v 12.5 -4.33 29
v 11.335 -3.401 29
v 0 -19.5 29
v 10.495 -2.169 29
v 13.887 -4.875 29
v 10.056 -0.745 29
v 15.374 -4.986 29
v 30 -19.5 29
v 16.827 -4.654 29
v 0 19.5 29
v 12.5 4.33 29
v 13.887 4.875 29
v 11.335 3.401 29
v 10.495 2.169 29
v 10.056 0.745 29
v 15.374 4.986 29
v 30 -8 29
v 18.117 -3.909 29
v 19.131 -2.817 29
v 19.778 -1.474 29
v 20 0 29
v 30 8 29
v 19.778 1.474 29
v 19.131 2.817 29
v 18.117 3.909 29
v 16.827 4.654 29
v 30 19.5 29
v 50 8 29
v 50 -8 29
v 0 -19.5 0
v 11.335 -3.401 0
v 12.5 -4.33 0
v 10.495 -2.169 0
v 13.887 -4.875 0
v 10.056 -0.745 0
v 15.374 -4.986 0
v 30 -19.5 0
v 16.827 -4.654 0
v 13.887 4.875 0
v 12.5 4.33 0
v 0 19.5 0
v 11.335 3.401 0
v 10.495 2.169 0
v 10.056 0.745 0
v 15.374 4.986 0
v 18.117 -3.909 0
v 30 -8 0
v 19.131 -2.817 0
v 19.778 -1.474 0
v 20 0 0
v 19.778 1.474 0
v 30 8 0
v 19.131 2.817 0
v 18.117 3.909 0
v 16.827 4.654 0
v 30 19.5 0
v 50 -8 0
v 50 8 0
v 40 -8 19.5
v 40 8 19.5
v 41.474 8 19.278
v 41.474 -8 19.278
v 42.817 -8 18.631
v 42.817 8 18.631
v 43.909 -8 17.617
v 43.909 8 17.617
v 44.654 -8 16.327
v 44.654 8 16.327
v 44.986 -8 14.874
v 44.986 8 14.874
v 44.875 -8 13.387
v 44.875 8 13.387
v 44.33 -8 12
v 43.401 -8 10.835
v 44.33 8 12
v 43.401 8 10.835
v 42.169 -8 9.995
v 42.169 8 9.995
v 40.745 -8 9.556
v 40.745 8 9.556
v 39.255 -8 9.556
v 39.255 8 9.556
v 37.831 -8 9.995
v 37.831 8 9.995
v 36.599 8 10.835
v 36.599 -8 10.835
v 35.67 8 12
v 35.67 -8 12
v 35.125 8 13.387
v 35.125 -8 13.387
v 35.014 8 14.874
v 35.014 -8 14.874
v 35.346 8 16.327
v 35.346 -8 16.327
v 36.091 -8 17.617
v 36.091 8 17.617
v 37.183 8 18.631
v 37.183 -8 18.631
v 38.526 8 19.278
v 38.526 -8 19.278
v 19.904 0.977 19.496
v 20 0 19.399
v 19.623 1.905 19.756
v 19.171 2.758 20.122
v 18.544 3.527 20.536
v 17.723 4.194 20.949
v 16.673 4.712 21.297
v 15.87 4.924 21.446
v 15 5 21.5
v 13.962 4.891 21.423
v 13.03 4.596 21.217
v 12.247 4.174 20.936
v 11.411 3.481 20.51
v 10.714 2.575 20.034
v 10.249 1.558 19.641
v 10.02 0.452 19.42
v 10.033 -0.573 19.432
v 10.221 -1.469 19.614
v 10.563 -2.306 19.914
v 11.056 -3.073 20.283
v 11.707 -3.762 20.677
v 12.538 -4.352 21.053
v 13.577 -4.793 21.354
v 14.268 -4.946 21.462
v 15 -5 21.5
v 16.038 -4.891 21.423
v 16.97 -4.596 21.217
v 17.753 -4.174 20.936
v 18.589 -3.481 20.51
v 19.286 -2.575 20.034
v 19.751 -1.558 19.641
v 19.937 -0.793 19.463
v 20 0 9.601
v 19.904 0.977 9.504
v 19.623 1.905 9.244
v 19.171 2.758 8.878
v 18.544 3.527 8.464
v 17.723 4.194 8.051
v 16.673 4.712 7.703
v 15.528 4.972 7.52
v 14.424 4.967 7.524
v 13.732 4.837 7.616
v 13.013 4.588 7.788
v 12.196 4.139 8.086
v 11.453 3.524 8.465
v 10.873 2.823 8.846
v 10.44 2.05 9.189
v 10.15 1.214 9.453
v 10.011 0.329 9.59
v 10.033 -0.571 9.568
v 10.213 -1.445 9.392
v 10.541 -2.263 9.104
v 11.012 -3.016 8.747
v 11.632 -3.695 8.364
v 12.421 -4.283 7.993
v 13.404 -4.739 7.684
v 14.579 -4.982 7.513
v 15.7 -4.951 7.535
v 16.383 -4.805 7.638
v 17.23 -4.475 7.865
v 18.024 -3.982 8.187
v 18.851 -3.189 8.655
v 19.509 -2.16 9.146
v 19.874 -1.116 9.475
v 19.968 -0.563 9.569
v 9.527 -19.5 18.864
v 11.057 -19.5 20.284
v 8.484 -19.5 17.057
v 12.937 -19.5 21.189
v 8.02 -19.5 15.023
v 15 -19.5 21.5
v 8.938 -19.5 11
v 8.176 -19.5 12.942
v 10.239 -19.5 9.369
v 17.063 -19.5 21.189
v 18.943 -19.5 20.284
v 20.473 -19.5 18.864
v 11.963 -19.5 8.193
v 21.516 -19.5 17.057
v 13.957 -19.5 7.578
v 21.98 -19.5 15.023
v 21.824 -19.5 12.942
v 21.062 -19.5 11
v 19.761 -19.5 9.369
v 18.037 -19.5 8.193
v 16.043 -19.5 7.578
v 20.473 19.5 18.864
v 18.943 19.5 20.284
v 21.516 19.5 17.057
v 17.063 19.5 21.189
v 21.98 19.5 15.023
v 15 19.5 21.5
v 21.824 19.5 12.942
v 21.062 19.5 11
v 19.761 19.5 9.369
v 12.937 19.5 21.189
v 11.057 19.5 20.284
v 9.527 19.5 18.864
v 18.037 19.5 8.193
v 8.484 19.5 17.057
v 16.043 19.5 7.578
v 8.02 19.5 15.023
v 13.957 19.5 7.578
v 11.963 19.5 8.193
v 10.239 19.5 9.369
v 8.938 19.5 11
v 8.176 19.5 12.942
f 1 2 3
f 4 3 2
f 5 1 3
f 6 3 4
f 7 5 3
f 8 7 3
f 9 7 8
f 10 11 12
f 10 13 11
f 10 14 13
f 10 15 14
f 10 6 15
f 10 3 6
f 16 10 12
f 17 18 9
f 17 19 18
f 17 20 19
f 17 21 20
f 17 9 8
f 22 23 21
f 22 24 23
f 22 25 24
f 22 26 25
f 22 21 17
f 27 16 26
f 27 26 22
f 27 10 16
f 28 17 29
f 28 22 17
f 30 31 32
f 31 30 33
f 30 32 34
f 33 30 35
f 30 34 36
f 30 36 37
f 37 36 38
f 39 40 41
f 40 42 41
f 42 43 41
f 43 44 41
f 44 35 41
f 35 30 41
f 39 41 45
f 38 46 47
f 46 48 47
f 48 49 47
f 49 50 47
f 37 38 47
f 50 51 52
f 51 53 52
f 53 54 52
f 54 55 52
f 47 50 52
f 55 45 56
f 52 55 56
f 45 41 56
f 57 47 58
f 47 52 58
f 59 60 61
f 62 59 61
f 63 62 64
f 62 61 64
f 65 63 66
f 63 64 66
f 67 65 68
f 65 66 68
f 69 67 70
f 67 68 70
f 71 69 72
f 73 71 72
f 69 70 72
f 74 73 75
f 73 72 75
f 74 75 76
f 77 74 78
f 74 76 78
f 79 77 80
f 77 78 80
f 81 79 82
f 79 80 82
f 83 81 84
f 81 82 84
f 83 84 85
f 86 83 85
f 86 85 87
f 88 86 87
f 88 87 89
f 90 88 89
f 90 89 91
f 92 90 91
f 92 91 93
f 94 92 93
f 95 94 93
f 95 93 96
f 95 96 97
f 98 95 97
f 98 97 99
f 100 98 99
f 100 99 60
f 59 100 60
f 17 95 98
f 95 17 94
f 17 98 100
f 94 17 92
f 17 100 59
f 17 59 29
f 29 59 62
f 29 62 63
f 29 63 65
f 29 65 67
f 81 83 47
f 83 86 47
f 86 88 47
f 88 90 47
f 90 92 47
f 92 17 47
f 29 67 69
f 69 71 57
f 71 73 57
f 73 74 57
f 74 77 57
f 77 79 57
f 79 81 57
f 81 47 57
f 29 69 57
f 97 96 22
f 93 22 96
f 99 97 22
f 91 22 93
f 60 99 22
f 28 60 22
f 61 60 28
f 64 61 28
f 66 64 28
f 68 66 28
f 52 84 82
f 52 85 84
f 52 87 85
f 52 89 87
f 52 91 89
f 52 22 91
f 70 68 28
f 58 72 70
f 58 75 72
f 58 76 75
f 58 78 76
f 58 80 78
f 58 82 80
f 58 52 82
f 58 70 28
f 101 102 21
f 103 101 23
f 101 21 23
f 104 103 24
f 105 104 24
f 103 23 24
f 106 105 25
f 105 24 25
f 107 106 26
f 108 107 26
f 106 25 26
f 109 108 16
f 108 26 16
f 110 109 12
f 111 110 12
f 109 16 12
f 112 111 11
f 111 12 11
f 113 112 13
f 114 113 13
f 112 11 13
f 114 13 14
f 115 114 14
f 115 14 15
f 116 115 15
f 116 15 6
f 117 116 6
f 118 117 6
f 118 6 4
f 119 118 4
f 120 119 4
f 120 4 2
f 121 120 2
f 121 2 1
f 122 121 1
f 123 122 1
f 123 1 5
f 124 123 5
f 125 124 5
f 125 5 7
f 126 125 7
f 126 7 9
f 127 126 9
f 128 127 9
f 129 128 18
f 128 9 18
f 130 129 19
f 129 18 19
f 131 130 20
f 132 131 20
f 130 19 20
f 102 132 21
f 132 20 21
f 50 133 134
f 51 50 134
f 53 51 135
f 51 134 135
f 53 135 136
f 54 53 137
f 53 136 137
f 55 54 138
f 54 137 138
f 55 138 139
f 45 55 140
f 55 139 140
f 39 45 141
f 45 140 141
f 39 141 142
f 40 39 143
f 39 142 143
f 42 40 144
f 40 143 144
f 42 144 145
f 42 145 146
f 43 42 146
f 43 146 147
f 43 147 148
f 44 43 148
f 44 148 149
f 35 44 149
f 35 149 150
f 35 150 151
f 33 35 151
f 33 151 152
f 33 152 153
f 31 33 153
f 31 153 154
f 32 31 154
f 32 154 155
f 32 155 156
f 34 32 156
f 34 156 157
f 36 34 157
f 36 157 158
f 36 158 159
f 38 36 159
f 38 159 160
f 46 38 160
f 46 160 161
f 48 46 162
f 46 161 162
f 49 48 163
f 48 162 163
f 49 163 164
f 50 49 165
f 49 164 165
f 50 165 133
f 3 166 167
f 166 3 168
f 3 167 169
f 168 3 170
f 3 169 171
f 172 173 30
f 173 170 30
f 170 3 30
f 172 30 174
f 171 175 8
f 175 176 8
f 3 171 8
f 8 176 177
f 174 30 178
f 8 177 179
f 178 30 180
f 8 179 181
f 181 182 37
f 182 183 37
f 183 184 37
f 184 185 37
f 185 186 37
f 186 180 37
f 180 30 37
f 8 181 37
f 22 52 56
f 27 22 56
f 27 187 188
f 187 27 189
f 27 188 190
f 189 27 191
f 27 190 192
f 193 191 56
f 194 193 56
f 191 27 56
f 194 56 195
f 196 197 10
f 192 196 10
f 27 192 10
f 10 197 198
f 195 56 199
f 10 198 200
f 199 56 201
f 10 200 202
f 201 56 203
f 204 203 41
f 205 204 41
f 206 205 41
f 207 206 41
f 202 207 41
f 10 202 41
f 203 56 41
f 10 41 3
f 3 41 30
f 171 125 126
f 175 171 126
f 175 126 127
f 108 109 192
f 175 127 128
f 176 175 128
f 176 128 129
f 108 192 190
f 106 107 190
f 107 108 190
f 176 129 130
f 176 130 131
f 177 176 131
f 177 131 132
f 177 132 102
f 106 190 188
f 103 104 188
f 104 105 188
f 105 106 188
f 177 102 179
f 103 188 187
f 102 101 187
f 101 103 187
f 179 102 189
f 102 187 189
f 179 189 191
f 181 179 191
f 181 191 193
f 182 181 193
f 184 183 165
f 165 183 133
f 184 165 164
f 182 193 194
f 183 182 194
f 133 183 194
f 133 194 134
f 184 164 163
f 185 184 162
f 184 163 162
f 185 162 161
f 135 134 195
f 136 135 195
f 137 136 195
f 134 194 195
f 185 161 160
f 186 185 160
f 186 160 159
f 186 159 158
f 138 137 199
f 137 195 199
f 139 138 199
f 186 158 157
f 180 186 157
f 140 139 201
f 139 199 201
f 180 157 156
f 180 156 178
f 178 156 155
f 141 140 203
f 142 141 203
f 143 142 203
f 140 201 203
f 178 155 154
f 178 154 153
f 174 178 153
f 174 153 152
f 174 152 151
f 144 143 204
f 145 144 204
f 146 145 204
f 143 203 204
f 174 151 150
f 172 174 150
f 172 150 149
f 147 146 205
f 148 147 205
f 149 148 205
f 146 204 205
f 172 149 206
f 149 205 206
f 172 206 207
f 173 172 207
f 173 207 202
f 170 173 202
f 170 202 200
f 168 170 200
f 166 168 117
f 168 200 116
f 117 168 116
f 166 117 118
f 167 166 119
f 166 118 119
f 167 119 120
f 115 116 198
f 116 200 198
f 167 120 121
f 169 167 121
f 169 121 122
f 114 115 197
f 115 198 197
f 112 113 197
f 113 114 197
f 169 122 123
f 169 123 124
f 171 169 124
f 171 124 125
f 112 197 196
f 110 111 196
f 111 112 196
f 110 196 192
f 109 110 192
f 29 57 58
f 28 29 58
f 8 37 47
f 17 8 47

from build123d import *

# Parameters (mm, degrees)
ESQUISSE1_W             = 20
ESQUISSE1_H             = 8
BOSS_EXTRU_1_DEPTH      = 29
ESQUISSE2_R             = 7
ESQUISSE2_R_2           = 5
ENL_V_MAT_EXTRU_1_DEPTH = 70.728043139
ESQUISSE4_R             = 5
ENL_V_MAT_EXTRU_2_DEPTH = 62.002049146


with BuildPart() as part:
    # Esquisse1 → Boss.-Extru.1 (new body)
    with BuildSketch(Plane.XY):
        Polygon((0, 0), (30, 0), (30, 8), (30, 19.5), (0, 19.5), align=None)
        Polygon((30, -19.5), (30, -8), (30, 0), (0, 0), (0, -19.5), align=None)
        with Locations((40, -4)):
            Rectangle(ESQUISSE1_W, ESQUISSE1_H)
        with Locations((40, 4)):
            Rectangle(ESQUISSE1_W, ESQUISSE1_H)
    extrude(amount=BOSS_EXTRU_1_DEPTH)

    # Esquisse2 → Enlèv. mat.-Extru.1 (cut, through all)
    with BuildSketch(Plane(origin=(0, 19.5, 0), x_dir=(1, 0, 0), z_dir=(0, 1, 0))):
        with Locations(Location((15, -14.5, 0), (0, 0, 270))):
            Circle(ESQUISSE2_R)
        with Locations(Location((40, -14.5, 0), (0, 0, 270))):
            Circle(ESQUISSE2_R_2)
    extrude(amount=-ENL_V_MAT_EXTRU_1_DEPTH, mode=Mode.SUBTRACT)

    # Esquisse4 → Enlèv. mat.-Extru.2 (cut, through all)
    with BuildSketch(Plane.XY.offset(29)):
        with Locations((15, 0)):
            Circle(ESQUISSE4_R)
    extrude(amount=-ENL_V_MAT_EXTRU_2_DEPTH, mode=Mode.SUBTRACT)


solid = part.part
